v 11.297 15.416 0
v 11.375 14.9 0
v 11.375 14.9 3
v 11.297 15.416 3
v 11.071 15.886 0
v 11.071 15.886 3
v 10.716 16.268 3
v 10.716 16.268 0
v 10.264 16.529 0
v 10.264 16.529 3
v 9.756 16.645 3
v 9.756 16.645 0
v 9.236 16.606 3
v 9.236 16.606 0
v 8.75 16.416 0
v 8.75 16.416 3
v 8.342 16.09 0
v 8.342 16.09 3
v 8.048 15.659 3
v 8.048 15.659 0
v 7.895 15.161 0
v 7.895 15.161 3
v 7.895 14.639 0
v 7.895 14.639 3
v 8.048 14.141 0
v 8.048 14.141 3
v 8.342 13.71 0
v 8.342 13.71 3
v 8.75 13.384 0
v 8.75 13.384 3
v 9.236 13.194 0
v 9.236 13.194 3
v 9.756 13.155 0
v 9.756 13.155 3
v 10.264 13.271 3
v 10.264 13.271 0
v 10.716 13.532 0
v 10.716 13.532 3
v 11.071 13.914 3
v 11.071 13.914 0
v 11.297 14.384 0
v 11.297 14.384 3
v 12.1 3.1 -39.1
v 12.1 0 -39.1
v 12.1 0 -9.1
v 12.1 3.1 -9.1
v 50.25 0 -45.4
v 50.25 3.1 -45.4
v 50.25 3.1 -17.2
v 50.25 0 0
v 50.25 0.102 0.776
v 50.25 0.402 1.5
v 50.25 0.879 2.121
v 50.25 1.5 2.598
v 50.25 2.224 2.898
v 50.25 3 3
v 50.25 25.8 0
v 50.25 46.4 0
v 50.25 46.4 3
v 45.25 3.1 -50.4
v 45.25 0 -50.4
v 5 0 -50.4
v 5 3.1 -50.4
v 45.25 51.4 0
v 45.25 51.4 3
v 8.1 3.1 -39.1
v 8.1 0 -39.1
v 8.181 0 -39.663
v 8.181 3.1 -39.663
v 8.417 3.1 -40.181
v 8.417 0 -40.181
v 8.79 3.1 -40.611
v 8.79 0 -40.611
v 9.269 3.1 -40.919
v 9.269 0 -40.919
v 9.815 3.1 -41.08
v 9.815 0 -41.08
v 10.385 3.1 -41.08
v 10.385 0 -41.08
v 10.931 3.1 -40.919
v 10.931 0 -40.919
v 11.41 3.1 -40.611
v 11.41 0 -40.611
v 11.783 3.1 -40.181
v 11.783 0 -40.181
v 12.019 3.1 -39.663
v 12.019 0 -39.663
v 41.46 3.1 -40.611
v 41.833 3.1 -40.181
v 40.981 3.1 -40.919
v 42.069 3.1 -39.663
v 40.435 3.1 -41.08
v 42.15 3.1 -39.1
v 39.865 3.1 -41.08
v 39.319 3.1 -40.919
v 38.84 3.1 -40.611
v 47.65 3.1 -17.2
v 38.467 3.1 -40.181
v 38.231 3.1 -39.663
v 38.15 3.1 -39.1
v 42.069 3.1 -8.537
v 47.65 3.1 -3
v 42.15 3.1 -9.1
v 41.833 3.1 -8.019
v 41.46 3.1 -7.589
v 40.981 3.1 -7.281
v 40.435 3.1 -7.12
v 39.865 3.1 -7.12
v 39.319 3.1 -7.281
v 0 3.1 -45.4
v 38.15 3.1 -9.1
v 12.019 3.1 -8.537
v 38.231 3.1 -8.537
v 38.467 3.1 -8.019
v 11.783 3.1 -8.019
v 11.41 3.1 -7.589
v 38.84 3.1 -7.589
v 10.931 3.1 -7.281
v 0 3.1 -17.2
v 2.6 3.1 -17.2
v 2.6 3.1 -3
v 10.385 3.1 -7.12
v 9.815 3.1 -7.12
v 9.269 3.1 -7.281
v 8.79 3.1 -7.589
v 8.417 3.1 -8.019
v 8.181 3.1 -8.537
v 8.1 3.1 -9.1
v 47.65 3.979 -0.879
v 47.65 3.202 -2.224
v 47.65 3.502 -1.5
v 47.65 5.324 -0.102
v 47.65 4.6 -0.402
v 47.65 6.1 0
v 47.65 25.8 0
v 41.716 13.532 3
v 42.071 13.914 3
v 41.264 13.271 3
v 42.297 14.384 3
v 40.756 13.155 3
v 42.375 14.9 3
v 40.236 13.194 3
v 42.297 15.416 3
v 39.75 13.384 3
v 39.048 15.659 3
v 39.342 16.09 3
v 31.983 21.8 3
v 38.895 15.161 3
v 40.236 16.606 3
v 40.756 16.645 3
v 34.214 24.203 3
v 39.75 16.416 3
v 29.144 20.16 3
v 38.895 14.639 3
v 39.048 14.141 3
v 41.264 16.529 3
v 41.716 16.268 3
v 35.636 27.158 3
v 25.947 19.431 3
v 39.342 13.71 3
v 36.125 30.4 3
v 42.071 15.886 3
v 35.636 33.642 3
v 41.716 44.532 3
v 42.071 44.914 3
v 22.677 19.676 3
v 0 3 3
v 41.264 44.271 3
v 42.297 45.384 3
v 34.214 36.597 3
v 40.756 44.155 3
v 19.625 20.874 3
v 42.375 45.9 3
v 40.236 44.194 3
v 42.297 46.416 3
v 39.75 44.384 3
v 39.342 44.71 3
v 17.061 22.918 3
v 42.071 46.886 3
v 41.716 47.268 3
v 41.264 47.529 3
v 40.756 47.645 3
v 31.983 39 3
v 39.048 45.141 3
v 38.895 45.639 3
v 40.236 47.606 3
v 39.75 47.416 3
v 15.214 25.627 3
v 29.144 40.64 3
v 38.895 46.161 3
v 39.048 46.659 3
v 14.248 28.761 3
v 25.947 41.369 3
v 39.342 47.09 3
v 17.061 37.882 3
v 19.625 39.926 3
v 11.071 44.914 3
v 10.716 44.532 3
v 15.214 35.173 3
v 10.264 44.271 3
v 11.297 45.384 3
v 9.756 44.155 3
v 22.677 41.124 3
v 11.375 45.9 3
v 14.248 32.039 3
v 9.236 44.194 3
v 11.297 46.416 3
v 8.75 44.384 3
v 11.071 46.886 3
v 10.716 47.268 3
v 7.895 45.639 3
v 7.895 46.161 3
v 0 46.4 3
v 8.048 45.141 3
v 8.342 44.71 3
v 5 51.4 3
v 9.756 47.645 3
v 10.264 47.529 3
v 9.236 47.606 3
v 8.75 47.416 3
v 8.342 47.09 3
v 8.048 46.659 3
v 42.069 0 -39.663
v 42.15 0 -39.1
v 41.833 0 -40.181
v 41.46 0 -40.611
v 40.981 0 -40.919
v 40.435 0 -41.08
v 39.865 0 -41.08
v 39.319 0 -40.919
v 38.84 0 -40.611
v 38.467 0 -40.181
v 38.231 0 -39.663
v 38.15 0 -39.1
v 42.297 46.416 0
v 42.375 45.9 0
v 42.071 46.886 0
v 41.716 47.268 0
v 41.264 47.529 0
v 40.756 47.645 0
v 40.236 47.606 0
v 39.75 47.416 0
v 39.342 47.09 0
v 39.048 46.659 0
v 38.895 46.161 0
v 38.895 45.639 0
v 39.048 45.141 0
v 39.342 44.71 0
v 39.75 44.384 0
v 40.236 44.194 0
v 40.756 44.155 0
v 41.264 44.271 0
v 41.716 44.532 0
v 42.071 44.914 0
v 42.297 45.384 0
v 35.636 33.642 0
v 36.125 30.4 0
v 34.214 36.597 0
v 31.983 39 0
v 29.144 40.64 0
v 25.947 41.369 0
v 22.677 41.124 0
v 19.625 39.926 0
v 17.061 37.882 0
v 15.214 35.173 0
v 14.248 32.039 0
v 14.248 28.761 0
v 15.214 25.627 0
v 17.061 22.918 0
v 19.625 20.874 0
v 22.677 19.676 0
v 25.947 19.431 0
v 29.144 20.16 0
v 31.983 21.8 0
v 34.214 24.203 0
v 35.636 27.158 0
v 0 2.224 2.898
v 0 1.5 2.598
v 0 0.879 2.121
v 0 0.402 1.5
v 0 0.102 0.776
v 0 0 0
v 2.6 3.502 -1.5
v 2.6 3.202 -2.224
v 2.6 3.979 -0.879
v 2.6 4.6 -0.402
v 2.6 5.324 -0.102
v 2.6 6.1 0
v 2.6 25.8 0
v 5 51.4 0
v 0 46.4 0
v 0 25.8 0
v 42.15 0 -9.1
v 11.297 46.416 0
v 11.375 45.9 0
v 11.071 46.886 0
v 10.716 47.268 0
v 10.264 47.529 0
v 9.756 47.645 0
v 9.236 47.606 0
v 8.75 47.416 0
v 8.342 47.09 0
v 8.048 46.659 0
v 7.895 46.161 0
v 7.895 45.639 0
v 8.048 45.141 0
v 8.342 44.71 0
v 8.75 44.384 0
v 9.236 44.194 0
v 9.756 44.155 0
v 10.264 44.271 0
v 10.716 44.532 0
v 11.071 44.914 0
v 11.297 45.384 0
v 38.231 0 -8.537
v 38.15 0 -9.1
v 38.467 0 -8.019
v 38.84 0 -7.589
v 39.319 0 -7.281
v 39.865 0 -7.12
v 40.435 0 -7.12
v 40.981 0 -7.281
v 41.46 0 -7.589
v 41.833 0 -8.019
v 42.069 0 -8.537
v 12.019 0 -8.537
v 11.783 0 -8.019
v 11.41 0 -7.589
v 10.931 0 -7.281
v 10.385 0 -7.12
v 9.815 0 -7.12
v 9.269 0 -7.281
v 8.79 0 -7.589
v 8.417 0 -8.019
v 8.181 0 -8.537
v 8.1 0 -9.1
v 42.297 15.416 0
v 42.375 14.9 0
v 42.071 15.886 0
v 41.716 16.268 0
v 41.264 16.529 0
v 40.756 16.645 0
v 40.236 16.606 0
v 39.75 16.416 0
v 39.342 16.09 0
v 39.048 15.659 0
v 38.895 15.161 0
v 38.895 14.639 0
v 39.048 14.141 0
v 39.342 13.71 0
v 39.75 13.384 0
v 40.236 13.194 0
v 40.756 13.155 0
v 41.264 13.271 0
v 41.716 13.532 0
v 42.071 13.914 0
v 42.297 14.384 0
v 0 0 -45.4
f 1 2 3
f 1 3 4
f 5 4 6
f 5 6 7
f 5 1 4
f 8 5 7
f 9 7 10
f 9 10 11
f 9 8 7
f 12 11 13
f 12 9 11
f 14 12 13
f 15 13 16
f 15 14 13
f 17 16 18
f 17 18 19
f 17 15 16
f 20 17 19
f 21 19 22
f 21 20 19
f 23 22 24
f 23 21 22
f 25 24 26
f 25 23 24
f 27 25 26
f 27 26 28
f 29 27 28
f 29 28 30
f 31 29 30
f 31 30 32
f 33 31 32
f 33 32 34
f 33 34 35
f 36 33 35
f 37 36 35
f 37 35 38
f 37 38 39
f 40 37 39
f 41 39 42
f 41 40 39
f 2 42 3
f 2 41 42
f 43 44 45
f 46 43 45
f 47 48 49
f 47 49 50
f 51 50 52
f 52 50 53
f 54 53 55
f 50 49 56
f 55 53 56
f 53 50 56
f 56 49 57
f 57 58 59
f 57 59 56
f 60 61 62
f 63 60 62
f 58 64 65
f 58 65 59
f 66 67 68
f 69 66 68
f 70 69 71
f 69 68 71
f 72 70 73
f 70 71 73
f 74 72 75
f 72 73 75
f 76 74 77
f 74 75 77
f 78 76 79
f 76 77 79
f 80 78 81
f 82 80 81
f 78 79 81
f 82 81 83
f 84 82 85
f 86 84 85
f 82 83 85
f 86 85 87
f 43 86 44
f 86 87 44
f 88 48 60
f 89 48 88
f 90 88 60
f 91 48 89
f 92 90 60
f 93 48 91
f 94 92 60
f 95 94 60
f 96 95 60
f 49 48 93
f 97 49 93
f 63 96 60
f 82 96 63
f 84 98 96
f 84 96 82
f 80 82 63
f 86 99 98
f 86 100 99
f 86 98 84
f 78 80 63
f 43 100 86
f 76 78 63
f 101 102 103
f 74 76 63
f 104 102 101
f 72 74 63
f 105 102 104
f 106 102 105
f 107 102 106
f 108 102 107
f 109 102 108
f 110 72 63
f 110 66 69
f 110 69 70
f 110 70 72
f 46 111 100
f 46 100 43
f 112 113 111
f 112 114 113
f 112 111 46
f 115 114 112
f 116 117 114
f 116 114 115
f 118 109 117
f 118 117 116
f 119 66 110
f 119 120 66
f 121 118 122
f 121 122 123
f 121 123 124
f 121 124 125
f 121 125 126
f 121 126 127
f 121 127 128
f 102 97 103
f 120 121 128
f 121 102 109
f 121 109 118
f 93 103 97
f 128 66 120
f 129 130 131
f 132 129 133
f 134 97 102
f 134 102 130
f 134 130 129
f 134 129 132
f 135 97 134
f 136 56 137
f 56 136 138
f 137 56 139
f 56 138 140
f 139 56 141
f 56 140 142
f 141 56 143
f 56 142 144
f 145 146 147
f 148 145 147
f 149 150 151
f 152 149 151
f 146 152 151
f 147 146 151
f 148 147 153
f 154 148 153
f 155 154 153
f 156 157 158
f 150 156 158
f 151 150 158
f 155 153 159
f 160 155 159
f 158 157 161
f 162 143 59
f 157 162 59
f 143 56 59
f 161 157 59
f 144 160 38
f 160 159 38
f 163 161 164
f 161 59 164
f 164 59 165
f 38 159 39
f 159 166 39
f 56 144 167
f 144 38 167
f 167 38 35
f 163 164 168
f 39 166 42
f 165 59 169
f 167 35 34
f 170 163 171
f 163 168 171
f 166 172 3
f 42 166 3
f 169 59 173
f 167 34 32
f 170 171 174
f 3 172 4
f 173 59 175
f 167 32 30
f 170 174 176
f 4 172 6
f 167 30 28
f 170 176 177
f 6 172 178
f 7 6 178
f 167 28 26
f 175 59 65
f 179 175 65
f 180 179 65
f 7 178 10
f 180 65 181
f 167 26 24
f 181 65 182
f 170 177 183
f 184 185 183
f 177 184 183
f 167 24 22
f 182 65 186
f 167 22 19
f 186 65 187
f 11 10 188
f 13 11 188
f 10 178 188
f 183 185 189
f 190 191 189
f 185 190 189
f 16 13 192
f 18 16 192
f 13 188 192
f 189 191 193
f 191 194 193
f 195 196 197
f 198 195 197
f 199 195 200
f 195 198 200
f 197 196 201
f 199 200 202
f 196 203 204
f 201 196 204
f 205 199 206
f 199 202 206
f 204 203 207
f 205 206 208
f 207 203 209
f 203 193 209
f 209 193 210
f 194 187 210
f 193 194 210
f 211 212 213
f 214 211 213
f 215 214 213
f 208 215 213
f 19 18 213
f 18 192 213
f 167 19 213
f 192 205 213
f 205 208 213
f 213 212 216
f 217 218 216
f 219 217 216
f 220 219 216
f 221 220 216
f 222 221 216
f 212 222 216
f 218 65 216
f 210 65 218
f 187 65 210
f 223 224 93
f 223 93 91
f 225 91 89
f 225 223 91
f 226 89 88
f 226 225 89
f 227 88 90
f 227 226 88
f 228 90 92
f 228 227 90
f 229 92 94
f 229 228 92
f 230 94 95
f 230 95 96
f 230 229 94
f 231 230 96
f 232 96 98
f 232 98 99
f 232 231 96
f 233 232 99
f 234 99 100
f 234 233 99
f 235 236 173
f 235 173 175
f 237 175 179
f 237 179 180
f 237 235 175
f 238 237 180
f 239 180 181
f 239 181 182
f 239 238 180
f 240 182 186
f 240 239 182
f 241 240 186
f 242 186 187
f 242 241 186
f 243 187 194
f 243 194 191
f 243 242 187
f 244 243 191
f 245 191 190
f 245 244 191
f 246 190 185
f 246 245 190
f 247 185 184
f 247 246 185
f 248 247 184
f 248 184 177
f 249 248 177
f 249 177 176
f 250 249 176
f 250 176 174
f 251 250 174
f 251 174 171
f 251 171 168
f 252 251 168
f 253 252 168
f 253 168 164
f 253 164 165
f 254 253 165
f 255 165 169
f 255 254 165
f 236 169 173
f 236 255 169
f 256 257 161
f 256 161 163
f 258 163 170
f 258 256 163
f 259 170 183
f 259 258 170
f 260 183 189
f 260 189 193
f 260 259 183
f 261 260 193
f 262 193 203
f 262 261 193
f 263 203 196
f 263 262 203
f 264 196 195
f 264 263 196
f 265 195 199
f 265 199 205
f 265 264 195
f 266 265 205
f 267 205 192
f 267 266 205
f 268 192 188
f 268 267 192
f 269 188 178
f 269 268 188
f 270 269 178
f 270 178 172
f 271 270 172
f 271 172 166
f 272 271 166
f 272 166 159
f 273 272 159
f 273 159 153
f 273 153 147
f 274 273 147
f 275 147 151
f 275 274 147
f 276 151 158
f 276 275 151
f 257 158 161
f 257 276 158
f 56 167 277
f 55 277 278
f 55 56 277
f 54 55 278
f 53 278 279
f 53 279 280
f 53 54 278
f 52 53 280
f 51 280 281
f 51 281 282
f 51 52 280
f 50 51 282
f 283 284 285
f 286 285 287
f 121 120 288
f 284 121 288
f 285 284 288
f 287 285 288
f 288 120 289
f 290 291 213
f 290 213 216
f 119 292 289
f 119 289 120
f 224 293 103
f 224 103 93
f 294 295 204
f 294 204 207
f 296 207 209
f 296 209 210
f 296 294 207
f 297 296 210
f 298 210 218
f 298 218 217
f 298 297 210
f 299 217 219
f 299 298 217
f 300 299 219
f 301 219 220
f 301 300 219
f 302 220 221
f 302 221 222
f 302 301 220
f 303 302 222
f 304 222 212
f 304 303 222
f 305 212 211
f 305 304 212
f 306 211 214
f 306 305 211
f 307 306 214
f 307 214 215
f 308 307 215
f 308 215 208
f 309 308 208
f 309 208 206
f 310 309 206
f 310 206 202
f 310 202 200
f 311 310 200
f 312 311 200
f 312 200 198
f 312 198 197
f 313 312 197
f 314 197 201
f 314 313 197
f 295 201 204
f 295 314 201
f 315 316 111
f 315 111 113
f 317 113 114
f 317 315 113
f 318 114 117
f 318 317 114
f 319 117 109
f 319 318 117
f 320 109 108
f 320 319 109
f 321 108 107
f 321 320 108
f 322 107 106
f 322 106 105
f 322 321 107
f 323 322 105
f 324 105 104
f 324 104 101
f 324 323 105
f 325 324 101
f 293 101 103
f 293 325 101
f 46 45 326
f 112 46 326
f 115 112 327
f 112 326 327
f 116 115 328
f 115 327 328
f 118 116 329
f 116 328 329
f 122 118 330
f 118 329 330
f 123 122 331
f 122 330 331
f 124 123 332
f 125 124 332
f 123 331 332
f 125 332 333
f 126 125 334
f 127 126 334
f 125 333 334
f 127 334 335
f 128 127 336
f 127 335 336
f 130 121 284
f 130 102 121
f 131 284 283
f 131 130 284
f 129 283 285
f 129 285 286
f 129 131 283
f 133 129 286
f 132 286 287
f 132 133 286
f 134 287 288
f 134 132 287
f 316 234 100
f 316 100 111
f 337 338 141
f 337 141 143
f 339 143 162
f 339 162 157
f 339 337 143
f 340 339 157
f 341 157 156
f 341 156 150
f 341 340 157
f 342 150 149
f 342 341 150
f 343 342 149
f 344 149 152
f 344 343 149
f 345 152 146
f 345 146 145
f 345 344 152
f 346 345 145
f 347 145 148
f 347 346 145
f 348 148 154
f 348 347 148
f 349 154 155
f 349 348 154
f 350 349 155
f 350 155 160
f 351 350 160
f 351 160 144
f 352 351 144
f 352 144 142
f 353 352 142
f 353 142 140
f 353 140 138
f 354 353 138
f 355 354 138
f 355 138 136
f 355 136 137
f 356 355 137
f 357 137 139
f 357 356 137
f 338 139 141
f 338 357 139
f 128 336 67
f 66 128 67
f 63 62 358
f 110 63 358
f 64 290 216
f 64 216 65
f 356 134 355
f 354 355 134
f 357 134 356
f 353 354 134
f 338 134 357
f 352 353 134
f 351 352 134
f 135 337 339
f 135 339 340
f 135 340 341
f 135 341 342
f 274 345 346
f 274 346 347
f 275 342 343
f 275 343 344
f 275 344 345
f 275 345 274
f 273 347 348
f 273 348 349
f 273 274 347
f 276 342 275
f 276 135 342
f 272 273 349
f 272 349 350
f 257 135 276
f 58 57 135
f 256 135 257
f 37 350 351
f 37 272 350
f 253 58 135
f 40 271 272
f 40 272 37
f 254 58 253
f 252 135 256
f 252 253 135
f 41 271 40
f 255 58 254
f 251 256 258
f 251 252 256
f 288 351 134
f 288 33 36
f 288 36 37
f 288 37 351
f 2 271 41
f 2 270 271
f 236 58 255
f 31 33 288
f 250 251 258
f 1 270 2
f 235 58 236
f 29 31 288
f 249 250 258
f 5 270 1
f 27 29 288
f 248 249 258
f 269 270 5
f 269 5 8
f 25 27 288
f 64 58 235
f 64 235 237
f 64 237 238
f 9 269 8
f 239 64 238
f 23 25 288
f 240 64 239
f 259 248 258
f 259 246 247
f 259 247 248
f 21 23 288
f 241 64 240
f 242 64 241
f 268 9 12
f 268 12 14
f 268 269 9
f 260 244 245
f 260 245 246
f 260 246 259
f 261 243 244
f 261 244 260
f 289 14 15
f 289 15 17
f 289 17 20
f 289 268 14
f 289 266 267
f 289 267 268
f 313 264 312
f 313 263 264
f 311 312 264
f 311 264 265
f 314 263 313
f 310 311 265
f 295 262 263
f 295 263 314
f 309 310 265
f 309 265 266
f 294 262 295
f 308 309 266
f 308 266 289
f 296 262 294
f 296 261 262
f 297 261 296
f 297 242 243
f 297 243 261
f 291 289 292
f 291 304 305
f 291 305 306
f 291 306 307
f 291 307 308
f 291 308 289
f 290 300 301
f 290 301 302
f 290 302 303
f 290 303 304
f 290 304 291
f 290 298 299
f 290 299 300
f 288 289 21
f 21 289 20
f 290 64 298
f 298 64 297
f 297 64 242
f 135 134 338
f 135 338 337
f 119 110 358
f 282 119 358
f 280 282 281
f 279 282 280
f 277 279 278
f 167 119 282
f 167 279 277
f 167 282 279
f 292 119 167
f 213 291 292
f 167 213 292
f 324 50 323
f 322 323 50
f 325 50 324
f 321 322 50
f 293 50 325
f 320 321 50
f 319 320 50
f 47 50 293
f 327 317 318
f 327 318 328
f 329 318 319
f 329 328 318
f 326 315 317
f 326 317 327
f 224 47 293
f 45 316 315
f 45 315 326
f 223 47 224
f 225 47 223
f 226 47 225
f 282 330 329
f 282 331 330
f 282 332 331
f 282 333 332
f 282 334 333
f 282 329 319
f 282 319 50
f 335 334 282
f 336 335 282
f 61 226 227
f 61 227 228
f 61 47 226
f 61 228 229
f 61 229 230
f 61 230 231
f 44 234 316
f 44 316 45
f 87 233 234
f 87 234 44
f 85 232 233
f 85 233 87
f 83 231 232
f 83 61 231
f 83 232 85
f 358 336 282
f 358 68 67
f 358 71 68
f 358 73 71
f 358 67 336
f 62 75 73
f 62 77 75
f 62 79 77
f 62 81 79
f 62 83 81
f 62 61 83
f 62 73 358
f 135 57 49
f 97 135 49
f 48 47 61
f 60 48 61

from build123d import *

# Parameters (mm, degrees)
SKETCH1_R           = 11
SKETCH1_R_2         = 1.75
BOSS_EXTRUDE1_DEPTH = 3
BOSS_EXTRUDE2_DEPTH = 3.1
BOSS_EXTRUDE3_DEPTH = 2.6
FILLET1_R           = 3
FILLET2_R           = 3


with BuildPart() as part:
    # Sketch1 → Boss-Extrude1 (new body)
    with BuildSketch(Plane.XY):
        Polygon((0, 46.4), (5, 51.4), (45.25, 51.4), (50.25, 46.4), (50.25, 0), (0, 0), align=None)
        with Locations((25.125, 30.4)):
            Circle(SKETCH1_R, mode=Mode.SUBTRACT)
        with Locations((9.625, 45.9)):
            Circle(SKETCH1_R_2, mode=Mode.SUBTRACT)
        with Locations((40.625, 45.9)):
            Circle(SKETCH1_R_2, mode=Mode.SUBTRACT)
        with Locations((40.625, 14.9)):
            Circle(SKETCH1_R_2, mode=Mode.SUBTRACT)
        with Locations((9.625, 14.9)):
            Circle(SKETCH1_R_2, mode=Mode.SUBTRACT)
    extrude(amount=BOSS_EXTRUDE1_DEPTH)

    # Sketch2 → Boss-Extrude2 (add)
    with BuildSketch(Plane.XZ):
        Polygon((0, 3), (50.25, 3), (50.25, -45.4), (45.25, -50.4), (5, -50.4), (0, -45.4), align=None)
        with BuildLine():
            Line((42.15, -9.1), (42.15, -39.1))
            ThreePointArc((42.15, -39.1), (40.15, -41.1), (38.15, -39.1))
            Line((38.15, -39.1), (38.15, -9.1))
            ThreePointArc((38.15, -9.1), (40.15, -7.1), (42.15, -9.1))
        make_face(mode=Mode.SUBTRACT)
        with BuildLine():
            Line((8.1, -9.1), (8.1, -39.1))
            ThreePointArc((8.1, -39.1), (10.1, -41.1), (12.1, -39.1))
            Line((12.1, -39.1), (12.1, -9.1))
            ThreePointArc((12.1, -9.1), (10.1, -7.1), (8.1, -9.1))
        make_face(mode=Mode.SUBTRACT)
    extrude(amount=-BOSS_EXTRUDE2_DEPTH)

    # Sketch3 → Boss-Extrude3 (add)
    with BuildSketch(Plane.ZY):
        Polygon((0, 25.8), (-17.2, 3.1), (-17.2, 0), (3, 0), (3, 25.8), align=None)
    boss_extrude3 = extrude(amount=-BOSS_EXTRUDE3_DEPTH)

    # Mirror1: Boss-Extrude3 across plane
    add(boss_extrude3.mirror(Plane.ZY.offset(-25.125)))

    # Fillet1
    fillet1_edges = [part.edges().sort_by_distance(p)[0] for p in [
        (25.125, 0, 3),
    ]]
    fillet(fillet1_edges, radius=FILLET1_R)

    # Fillet2
    fillet2_edges = [part.edges().sort_by_distance(p)[0] for p in [
        (25.125, 3.1, 0),
    ]]
    fillet(fillet2_edges, radius=FILLET2_R)


solid = part.part
